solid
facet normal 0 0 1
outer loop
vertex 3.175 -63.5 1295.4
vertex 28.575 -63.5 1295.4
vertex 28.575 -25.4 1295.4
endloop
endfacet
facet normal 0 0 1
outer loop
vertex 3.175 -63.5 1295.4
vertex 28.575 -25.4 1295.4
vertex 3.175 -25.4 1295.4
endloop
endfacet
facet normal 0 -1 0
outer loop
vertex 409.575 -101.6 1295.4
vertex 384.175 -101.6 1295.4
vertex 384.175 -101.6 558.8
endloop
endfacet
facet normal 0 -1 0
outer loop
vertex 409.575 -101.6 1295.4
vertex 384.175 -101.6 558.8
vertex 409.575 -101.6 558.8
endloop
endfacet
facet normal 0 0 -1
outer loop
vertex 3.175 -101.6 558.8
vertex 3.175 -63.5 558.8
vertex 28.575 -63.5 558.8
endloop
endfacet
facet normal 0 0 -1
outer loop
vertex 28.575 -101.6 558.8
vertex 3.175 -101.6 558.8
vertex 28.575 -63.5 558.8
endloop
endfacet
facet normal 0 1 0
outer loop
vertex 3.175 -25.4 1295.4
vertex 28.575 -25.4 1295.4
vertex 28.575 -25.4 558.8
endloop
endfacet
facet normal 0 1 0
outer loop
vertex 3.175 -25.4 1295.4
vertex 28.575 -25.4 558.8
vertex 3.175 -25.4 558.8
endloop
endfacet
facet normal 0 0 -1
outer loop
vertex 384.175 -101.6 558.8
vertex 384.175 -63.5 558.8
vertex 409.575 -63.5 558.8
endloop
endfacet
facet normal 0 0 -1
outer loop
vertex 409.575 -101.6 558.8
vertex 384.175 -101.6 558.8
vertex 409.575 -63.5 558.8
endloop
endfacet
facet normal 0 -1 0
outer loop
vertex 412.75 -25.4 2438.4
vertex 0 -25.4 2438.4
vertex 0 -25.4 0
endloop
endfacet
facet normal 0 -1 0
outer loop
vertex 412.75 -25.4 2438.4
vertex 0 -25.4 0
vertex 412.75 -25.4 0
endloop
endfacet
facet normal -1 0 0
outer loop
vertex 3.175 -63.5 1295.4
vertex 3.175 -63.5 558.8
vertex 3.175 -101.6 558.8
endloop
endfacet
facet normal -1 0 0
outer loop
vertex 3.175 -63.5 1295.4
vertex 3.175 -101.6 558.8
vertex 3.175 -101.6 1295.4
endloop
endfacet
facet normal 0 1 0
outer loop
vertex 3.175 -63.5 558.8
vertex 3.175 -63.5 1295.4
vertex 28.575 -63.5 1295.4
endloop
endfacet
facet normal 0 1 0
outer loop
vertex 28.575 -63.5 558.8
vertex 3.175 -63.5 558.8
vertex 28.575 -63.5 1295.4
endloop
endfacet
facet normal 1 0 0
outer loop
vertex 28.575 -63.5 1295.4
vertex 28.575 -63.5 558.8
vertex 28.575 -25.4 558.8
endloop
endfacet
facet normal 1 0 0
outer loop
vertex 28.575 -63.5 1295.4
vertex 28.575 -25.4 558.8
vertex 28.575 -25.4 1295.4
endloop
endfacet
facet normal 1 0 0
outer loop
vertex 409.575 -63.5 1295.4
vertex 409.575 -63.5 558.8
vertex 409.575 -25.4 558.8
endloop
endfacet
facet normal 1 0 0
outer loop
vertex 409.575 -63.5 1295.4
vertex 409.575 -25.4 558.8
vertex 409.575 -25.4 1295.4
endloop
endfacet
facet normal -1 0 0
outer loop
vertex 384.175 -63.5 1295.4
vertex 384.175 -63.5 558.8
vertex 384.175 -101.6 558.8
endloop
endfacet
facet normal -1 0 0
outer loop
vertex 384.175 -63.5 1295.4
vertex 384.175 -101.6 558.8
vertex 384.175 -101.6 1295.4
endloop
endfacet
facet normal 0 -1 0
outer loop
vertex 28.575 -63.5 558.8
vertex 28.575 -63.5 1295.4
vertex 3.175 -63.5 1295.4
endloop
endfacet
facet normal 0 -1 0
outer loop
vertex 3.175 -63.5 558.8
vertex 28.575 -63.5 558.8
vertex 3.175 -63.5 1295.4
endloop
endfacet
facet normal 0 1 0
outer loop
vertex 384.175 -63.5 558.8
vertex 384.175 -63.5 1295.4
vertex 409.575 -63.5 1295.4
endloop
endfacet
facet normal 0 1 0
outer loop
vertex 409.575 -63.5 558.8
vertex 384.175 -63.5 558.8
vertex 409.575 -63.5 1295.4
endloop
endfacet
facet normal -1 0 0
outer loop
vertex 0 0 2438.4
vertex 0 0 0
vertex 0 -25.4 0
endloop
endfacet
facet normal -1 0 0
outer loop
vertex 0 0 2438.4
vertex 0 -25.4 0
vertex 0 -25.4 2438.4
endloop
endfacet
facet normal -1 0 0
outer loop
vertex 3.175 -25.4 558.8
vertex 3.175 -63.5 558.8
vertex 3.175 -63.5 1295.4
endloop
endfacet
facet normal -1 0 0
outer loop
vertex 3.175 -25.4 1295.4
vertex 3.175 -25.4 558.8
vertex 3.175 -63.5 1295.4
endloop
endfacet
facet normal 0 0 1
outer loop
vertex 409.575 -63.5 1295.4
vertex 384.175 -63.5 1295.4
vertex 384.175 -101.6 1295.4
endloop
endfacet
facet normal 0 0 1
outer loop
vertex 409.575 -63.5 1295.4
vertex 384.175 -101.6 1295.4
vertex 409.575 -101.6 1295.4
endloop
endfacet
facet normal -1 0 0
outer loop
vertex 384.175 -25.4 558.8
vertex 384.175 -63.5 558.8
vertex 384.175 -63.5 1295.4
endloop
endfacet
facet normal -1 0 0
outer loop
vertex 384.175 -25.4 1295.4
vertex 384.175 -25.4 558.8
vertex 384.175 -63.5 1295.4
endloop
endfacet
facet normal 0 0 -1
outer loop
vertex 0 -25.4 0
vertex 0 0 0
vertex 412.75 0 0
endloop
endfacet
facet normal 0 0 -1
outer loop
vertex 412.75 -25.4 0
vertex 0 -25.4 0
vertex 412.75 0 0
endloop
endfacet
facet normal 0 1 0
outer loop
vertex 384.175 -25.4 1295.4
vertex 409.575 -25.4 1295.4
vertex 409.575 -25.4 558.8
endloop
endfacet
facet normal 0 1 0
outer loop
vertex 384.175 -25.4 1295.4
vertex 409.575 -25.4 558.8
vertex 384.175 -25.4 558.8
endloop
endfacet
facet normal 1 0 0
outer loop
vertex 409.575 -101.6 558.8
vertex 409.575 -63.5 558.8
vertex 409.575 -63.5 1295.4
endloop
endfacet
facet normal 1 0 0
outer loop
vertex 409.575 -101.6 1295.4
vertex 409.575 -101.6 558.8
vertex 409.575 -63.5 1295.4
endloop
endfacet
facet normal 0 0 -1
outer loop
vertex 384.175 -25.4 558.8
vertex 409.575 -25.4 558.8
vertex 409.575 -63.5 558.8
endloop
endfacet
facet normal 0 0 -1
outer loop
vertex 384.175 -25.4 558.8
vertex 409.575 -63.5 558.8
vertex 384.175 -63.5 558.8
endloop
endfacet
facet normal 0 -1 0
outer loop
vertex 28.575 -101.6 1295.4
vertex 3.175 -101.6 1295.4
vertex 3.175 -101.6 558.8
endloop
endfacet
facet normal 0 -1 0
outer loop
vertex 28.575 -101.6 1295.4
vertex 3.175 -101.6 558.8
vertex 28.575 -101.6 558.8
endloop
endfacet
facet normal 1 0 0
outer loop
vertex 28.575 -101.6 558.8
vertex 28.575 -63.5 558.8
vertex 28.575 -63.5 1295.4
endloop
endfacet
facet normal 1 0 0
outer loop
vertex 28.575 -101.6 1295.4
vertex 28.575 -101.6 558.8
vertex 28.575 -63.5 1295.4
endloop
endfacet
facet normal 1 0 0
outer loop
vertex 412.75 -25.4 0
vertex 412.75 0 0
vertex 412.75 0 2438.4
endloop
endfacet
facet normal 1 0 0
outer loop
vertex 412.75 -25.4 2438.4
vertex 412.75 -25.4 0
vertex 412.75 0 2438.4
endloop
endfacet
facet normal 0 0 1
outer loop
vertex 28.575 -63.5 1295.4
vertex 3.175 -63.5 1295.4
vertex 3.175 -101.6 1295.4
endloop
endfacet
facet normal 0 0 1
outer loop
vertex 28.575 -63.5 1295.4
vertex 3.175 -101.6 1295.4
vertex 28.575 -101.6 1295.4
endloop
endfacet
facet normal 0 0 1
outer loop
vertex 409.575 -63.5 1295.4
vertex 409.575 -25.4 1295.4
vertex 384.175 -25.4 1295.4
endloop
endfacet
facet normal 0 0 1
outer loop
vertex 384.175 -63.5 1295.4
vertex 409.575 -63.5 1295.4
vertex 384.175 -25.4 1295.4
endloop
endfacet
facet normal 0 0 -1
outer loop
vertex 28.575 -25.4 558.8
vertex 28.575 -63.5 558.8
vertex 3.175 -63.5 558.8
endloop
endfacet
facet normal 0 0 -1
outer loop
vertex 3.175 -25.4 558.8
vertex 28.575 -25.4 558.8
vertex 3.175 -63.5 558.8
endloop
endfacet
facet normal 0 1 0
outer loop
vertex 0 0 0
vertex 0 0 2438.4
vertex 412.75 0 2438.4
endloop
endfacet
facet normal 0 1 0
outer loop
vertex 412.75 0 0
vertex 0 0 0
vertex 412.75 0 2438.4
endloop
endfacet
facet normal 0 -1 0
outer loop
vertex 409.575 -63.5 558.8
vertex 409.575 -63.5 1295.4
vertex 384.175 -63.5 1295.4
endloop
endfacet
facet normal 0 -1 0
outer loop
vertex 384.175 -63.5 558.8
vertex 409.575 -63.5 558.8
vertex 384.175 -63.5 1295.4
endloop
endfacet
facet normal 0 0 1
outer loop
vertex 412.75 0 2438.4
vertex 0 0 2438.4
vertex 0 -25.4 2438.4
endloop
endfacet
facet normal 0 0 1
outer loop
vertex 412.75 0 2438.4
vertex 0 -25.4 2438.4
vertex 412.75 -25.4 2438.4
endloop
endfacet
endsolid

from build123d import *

# Parameters (mm, degrees)
F0_W      = 412.75
F0_H      = 2438.4
F1_DEPTH  = 25.4
F3_DEPTH  = 76.2
F4_W      = 406.4
F4_H      = 584.2
F5_DEPTH  = 38.1
F7_W      = 25.4
F7_H      = 736.6
F8_DEPTH  = 38.1
F9_W      = 25.4
F9_H      = 736.6
F10_DEPTH = 38.1


with BuildPart() as f1:
    # F0 (on Front) → F1 (new body)
    with BuildSketch(Plane.XZ):
        with Locations((206.375, 1219.2)):
            Rectangle(F0_W, F0_H)
    extrude(amount=F1_DEPTH)


with BuildPart() as f3:
    # F2 (on face) → F3 (new body)
    with BuildSketch(Plane.XZ.offset(25.4)):
        Polygon((409.575, 863.6), (3.175, 863.6), (3.175, 127), (28.575, 127), (28.575, 800.1), (384.175, 800.1), (384.175, 127), (409.575, 127), align=None)
    extrude(amount=F3_DEPTH)


with BuildPart() as f5:
    # F4 (on face) → F5 (new body)
    with BuildSketch(Plane.XZ.offset(25.4)):
        with Locations((206.375, 1003.3)):
            Rectangle(F4_W, F4_H)
    extrude(amount=F5_DEPTH)


with BuildPart() as f8:
    # F7 (on face) → F8 (new body)
    with BuildSketch(Plane.XZ.offset(63.5)):
        with Locations((15.875, 927.1)):
            Rectangle(F7_W, F7_H)
        with Locations((396.875, 927.1)):
            Rectangle(F7_W, F7_H)
    extrude(amount=F8_DEPTH)


with BuildPart() as f10:
    # F9 (on face) → F10 (new body)
    with BuildSketch(Plane(origin=(0, -63.5, 0), x_dir=(-1, 0, 0), z_dir=(0, 1, 0))):
        with Locations((-15.875, 927.1)):
            Rectangle(F9_W, F9_H)
        with Locations((-396.875, 927.1)):
            Rectangle(F9_W, F9_H)
    extrude(amount=F10_DEPTH)


solid = Compound([f1.part, f8.part, f10.part])
